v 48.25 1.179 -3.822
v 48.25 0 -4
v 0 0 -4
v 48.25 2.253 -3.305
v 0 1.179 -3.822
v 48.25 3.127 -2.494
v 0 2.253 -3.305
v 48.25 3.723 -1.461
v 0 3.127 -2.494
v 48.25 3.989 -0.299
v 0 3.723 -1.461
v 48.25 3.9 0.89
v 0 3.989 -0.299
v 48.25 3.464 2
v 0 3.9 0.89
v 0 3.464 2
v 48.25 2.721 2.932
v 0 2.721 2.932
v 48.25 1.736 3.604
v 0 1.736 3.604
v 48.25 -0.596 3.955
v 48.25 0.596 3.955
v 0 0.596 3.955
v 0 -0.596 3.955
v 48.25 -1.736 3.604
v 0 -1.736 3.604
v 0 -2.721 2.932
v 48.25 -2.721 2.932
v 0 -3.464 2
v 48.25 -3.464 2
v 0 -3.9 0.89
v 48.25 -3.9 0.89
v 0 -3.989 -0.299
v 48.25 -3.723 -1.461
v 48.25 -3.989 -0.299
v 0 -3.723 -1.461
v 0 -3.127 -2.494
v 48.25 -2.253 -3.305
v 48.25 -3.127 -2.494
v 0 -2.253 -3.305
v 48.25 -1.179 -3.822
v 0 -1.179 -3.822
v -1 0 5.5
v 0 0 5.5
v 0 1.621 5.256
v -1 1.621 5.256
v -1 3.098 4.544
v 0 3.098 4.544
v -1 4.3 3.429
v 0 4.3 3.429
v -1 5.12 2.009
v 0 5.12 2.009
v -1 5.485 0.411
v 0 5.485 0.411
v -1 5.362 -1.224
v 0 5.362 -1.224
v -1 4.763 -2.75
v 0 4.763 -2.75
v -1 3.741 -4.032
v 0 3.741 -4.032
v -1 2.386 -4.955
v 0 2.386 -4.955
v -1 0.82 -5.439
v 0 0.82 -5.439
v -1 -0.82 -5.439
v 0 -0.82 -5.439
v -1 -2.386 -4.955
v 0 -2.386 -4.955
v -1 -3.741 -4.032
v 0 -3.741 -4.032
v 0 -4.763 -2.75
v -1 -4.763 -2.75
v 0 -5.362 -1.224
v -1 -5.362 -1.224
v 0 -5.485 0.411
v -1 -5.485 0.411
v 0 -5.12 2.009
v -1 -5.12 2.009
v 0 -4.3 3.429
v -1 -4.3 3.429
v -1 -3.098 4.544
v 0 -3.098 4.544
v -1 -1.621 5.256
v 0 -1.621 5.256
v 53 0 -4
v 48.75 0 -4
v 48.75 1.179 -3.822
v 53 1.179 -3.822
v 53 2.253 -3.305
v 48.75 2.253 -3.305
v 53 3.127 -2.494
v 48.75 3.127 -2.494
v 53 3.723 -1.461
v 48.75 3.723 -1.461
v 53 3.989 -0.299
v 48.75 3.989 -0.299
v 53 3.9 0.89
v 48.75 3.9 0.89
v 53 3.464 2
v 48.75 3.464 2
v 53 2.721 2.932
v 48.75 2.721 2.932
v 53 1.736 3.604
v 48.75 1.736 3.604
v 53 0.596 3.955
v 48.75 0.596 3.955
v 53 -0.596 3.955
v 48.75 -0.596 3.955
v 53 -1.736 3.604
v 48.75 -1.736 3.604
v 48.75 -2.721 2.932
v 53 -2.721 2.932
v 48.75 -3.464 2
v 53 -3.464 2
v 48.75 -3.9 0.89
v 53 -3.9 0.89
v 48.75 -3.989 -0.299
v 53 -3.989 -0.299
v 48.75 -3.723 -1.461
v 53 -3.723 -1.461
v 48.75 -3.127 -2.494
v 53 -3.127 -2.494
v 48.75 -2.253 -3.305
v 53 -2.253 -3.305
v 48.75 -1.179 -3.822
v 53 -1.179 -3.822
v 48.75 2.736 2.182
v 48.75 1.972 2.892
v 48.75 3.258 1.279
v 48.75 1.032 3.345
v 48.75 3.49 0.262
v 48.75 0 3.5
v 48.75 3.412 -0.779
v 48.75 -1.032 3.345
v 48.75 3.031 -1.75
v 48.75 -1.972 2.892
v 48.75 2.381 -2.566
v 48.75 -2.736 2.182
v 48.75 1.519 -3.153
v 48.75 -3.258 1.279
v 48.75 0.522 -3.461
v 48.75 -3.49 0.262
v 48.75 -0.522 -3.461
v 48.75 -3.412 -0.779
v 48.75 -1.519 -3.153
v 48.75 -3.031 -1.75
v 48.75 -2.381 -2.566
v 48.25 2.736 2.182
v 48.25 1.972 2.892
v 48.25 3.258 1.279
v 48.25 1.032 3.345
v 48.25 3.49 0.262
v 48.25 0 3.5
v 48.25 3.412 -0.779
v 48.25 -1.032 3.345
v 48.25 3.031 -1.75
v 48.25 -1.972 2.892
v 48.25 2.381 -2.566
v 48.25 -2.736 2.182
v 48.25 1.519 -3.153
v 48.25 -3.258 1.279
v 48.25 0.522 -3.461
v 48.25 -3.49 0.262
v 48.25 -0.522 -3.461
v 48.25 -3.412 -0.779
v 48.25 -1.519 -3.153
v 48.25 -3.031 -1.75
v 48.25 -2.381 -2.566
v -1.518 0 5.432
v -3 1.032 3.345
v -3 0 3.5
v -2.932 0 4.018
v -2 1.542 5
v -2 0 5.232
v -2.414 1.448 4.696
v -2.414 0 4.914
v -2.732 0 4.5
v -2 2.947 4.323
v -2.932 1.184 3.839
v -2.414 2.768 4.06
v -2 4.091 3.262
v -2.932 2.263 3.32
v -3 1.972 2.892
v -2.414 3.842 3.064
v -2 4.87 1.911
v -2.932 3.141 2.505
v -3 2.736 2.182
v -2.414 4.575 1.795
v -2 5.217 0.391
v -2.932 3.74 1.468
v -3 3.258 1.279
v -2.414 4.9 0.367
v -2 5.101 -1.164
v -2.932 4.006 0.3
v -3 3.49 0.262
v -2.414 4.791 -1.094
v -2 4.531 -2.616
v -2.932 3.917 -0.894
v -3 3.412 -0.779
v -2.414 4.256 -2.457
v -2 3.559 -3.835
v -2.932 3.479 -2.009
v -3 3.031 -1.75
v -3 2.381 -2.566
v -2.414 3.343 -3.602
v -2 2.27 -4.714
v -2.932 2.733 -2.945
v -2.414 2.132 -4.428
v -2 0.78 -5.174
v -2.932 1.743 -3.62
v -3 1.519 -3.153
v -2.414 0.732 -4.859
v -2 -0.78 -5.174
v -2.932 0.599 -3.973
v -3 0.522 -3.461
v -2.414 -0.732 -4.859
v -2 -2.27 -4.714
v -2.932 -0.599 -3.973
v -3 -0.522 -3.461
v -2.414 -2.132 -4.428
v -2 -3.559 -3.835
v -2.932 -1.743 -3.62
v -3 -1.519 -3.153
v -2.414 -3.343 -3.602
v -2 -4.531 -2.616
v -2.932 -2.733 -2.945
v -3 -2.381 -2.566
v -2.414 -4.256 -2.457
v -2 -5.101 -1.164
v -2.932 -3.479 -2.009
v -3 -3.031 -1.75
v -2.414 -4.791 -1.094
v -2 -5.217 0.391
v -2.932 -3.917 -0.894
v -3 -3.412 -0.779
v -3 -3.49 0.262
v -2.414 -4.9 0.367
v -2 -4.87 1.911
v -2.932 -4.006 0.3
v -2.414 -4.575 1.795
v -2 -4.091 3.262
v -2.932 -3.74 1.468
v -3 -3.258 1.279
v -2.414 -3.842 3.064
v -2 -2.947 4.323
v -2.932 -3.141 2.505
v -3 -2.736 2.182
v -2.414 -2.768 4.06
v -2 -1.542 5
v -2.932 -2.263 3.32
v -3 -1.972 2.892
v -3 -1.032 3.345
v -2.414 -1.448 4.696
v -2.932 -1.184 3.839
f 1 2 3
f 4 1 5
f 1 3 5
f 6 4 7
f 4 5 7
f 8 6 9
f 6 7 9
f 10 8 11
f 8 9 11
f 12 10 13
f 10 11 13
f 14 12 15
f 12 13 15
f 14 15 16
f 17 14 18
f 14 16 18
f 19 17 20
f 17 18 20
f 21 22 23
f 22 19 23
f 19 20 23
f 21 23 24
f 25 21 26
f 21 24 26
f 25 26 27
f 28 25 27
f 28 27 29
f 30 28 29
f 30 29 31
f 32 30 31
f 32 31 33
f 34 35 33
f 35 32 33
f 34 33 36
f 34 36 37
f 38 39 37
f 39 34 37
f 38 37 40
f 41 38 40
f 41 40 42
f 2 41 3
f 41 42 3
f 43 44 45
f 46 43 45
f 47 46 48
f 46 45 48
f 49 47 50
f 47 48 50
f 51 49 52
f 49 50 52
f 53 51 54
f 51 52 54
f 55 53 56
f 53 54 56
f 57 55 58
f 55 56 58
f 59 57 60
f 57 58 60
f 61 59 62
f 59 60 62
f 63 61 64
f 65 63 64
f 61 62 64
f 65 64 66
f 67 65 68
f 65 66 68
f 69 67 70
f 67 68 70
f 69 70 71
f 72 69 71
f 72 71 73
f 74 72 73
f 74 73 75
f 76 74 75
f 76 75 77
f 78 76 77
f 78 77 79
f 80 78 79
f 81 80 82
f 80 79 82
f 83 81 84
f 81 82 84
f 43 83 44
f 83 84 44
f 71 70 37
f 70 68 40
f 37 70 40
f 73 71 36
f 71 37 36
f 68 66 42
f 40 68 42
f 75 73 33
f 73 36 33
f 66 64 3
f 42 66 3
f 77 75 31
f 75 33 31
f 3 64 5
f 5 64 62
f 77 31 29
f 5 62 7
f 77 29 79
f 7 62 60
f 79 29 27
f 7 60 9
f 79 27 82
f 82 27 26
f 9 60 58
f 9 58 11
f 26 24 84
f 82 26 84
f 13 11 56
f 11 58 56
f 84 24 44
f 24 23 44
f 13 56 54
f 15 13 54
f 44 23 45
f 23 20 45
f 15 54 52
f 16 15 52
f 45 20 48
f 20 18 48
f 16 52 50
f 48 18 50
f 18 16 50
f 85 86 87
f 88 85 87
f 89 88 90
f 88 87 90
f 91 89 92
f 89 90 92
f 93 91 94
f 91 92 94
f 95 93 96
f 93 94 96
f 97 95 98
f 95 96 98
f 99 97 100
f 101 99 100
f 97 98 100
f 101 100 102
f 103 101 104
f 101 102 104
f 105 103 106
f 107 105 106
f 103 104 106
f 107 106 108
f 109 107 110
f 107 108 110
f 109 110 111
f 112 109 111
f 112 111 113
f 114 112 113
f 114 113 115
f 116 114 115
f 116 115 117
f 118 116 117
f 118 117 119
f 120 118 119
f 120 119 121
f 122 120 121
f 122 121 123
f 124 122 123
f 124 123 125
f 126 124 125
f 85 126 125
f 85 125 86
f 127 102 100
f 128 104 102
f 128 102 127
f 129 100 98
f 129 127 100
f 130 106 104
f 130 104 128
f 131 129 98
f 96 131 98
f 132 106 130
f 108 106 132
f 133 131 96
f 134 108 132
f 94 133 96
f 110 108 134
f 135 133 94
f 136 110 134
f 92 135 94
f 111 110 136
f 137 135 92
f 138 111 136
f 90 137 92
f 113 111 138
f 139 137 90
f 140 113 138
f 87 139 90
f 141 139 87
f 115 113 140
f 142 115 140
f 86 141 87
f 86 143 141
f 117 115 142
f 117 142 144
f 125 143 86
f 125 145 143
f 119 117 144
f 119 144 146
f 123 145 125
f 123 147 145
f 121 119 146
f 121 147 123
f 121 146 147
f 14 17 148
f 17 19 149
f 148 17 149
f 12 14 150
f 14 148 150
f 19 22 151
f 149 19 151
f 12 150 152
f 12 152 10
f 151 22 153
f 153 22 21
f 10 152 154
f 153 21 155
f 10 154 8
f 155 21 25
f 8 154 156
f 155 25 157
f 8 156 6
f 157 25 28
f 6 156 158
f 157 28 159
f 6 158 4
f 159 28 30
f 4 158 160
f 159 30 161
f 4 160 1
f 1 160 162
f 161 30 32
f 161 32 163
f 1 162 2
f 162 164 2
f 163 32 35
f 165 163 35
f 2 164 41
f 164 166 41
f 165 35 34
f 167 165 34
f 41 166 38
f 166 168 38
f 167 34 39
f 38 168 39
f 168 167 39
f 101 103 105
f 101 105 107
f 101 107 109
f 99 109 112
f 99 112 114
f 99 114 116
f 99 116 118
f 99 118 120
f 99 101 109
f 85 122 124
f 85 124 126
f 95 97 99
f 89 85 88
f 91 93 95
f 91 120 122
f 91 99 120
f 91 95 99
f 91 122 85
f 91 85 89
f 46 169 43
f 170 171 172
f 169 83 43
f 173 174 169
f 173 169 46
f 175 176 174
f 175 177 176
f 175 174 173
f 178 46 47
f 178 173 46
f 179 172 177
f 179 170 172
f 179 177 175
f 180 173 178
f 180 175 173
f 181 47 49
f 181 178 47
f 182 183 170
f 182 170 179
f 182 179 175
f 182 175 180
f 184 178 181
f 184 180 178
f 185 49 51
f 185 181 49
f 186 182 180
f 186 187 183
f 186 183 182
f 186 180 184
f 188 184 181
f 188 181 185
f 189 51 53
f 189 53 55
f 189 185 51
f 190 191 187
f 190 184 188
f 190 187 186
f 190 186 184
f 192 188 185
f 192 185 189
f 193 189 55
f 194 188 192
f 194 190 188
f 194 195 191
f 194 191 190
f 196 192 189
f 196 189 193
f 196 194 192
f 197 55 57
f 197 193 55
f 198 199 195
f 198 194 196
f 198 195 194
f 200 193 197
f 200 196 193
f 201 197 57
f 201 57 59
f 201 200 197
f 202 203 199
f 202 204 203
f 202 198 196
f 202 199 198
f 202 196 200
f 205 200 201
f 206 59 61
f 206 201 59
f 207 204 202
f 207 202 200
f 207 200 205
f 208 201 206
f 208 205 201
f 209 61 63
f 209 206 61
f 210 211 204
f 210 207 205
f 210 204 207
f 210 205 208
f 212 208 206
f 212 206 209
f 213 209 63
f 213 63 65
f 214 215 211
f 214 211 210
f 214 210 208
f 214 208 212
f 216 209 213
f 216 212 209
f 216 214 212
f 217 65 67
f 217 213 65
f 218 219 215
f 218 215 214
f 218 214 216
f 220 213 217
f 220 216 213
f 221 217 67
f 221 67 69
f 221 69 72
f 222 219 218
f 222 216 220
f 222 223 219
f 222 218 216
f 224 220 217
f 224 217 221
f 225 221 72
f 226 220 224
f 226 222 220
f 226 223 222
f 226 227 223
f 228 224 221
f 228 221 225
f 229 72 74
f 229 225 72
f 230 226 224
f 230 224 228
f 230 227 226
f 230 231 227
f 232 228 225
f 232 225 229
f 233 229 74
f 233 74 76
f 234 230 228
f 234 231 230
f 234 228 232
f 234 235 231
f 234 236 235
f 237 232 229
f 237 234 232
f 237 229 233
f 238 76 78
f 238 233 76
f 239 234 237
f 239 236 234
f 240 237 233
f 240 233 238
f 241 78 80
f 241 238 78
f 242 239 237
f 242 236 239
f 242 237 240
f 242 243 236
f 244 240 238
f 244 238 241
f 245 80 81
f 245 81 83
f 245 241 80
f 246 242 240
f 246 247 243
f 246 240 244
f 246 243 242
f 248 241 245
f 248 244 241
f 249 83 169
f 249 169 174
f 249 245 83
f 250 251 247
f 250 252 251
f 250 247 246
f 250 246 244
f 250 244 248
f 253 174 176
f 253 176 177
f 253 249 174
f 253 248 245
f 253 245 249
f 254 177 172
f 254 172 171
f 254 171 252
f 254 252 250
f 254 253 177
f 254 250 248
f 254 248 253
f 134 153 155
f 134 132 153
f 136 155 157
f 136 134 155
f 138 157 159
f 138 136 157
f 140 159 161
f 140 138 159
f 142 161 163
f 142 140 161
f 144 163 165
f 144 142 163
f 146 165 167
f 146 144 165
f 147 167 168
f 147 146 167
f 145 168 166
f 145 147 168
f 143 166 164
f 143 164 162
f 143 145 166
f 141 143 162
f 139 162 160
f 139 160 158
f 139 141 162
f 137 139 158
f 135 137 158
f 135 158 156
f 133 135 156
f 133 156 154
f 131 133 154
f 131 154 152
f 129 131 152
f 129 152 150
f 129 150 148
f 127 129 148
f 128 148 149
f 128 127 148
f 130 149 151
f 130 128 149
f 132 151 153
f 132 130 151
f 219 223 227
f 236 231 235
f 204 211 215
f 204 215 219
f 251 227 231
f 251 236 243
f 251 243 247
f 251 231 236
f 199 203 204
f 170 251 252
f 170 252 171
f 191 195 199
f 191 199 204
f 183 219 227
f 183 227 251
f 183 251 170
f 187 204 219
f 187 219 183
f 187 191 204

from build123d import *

# Parameters (mm, degrees)
SKETCH1_R           = 4
BOSS_EXTRUDE1_DEPTH = 53
SKETCH2_R           = 5.5
BOSS_EXTRUDE2_DEPTH = 3
FILLET1_R           = 2
SKETCH4_W           = 0.5
SKETCH4_H           = 1


with BuildPart() as part:
    # Sketch1 → Boss-Extrude1 (new body)
    with BuildSketch(Plane(origin=(0, 0, 0), x_dir=(0, 0, -1), z_dir=(1, 0, 0))):
        Circle(SKETCH1_R)
    extrude(amount=BOSS_EXTRUDE1_DEPTH)

    # Sketch2 → Boss-Extrude2 (add)
    with BuildSketch(Plane.ZY):
        Circle(SKETCH2_R)
    extrude(amount=BOSS_EXTRUDE2_DEPTH)

    # Fillet1
    fillet1_edges = [part.edges().sort_by_distance(p)[0] for p in [
        (-3, 0, -5.5),
    ]]
    fillet(fillet1_edges, radius=FILLET1_R)

    # Sketch4 → Cut-Revolve1 (revolve, cut)
    with BuildSketch(Plane.XY, mode=Mode.PRIVATE) as cut_revolve1_sk:
        with Locations((48.5, 4)):
            Rectangle(SKETCH4_W, SKETCH4_H)
    revolve(cut_revolve1_sk.sketch.rotate(Axis((0, 0, 0), (1, 0, 0)), 90), axis=Axis((0, 0, 0), (1, 0, 0)), mode=Mode.SUBTRACT)


solid = part.part
